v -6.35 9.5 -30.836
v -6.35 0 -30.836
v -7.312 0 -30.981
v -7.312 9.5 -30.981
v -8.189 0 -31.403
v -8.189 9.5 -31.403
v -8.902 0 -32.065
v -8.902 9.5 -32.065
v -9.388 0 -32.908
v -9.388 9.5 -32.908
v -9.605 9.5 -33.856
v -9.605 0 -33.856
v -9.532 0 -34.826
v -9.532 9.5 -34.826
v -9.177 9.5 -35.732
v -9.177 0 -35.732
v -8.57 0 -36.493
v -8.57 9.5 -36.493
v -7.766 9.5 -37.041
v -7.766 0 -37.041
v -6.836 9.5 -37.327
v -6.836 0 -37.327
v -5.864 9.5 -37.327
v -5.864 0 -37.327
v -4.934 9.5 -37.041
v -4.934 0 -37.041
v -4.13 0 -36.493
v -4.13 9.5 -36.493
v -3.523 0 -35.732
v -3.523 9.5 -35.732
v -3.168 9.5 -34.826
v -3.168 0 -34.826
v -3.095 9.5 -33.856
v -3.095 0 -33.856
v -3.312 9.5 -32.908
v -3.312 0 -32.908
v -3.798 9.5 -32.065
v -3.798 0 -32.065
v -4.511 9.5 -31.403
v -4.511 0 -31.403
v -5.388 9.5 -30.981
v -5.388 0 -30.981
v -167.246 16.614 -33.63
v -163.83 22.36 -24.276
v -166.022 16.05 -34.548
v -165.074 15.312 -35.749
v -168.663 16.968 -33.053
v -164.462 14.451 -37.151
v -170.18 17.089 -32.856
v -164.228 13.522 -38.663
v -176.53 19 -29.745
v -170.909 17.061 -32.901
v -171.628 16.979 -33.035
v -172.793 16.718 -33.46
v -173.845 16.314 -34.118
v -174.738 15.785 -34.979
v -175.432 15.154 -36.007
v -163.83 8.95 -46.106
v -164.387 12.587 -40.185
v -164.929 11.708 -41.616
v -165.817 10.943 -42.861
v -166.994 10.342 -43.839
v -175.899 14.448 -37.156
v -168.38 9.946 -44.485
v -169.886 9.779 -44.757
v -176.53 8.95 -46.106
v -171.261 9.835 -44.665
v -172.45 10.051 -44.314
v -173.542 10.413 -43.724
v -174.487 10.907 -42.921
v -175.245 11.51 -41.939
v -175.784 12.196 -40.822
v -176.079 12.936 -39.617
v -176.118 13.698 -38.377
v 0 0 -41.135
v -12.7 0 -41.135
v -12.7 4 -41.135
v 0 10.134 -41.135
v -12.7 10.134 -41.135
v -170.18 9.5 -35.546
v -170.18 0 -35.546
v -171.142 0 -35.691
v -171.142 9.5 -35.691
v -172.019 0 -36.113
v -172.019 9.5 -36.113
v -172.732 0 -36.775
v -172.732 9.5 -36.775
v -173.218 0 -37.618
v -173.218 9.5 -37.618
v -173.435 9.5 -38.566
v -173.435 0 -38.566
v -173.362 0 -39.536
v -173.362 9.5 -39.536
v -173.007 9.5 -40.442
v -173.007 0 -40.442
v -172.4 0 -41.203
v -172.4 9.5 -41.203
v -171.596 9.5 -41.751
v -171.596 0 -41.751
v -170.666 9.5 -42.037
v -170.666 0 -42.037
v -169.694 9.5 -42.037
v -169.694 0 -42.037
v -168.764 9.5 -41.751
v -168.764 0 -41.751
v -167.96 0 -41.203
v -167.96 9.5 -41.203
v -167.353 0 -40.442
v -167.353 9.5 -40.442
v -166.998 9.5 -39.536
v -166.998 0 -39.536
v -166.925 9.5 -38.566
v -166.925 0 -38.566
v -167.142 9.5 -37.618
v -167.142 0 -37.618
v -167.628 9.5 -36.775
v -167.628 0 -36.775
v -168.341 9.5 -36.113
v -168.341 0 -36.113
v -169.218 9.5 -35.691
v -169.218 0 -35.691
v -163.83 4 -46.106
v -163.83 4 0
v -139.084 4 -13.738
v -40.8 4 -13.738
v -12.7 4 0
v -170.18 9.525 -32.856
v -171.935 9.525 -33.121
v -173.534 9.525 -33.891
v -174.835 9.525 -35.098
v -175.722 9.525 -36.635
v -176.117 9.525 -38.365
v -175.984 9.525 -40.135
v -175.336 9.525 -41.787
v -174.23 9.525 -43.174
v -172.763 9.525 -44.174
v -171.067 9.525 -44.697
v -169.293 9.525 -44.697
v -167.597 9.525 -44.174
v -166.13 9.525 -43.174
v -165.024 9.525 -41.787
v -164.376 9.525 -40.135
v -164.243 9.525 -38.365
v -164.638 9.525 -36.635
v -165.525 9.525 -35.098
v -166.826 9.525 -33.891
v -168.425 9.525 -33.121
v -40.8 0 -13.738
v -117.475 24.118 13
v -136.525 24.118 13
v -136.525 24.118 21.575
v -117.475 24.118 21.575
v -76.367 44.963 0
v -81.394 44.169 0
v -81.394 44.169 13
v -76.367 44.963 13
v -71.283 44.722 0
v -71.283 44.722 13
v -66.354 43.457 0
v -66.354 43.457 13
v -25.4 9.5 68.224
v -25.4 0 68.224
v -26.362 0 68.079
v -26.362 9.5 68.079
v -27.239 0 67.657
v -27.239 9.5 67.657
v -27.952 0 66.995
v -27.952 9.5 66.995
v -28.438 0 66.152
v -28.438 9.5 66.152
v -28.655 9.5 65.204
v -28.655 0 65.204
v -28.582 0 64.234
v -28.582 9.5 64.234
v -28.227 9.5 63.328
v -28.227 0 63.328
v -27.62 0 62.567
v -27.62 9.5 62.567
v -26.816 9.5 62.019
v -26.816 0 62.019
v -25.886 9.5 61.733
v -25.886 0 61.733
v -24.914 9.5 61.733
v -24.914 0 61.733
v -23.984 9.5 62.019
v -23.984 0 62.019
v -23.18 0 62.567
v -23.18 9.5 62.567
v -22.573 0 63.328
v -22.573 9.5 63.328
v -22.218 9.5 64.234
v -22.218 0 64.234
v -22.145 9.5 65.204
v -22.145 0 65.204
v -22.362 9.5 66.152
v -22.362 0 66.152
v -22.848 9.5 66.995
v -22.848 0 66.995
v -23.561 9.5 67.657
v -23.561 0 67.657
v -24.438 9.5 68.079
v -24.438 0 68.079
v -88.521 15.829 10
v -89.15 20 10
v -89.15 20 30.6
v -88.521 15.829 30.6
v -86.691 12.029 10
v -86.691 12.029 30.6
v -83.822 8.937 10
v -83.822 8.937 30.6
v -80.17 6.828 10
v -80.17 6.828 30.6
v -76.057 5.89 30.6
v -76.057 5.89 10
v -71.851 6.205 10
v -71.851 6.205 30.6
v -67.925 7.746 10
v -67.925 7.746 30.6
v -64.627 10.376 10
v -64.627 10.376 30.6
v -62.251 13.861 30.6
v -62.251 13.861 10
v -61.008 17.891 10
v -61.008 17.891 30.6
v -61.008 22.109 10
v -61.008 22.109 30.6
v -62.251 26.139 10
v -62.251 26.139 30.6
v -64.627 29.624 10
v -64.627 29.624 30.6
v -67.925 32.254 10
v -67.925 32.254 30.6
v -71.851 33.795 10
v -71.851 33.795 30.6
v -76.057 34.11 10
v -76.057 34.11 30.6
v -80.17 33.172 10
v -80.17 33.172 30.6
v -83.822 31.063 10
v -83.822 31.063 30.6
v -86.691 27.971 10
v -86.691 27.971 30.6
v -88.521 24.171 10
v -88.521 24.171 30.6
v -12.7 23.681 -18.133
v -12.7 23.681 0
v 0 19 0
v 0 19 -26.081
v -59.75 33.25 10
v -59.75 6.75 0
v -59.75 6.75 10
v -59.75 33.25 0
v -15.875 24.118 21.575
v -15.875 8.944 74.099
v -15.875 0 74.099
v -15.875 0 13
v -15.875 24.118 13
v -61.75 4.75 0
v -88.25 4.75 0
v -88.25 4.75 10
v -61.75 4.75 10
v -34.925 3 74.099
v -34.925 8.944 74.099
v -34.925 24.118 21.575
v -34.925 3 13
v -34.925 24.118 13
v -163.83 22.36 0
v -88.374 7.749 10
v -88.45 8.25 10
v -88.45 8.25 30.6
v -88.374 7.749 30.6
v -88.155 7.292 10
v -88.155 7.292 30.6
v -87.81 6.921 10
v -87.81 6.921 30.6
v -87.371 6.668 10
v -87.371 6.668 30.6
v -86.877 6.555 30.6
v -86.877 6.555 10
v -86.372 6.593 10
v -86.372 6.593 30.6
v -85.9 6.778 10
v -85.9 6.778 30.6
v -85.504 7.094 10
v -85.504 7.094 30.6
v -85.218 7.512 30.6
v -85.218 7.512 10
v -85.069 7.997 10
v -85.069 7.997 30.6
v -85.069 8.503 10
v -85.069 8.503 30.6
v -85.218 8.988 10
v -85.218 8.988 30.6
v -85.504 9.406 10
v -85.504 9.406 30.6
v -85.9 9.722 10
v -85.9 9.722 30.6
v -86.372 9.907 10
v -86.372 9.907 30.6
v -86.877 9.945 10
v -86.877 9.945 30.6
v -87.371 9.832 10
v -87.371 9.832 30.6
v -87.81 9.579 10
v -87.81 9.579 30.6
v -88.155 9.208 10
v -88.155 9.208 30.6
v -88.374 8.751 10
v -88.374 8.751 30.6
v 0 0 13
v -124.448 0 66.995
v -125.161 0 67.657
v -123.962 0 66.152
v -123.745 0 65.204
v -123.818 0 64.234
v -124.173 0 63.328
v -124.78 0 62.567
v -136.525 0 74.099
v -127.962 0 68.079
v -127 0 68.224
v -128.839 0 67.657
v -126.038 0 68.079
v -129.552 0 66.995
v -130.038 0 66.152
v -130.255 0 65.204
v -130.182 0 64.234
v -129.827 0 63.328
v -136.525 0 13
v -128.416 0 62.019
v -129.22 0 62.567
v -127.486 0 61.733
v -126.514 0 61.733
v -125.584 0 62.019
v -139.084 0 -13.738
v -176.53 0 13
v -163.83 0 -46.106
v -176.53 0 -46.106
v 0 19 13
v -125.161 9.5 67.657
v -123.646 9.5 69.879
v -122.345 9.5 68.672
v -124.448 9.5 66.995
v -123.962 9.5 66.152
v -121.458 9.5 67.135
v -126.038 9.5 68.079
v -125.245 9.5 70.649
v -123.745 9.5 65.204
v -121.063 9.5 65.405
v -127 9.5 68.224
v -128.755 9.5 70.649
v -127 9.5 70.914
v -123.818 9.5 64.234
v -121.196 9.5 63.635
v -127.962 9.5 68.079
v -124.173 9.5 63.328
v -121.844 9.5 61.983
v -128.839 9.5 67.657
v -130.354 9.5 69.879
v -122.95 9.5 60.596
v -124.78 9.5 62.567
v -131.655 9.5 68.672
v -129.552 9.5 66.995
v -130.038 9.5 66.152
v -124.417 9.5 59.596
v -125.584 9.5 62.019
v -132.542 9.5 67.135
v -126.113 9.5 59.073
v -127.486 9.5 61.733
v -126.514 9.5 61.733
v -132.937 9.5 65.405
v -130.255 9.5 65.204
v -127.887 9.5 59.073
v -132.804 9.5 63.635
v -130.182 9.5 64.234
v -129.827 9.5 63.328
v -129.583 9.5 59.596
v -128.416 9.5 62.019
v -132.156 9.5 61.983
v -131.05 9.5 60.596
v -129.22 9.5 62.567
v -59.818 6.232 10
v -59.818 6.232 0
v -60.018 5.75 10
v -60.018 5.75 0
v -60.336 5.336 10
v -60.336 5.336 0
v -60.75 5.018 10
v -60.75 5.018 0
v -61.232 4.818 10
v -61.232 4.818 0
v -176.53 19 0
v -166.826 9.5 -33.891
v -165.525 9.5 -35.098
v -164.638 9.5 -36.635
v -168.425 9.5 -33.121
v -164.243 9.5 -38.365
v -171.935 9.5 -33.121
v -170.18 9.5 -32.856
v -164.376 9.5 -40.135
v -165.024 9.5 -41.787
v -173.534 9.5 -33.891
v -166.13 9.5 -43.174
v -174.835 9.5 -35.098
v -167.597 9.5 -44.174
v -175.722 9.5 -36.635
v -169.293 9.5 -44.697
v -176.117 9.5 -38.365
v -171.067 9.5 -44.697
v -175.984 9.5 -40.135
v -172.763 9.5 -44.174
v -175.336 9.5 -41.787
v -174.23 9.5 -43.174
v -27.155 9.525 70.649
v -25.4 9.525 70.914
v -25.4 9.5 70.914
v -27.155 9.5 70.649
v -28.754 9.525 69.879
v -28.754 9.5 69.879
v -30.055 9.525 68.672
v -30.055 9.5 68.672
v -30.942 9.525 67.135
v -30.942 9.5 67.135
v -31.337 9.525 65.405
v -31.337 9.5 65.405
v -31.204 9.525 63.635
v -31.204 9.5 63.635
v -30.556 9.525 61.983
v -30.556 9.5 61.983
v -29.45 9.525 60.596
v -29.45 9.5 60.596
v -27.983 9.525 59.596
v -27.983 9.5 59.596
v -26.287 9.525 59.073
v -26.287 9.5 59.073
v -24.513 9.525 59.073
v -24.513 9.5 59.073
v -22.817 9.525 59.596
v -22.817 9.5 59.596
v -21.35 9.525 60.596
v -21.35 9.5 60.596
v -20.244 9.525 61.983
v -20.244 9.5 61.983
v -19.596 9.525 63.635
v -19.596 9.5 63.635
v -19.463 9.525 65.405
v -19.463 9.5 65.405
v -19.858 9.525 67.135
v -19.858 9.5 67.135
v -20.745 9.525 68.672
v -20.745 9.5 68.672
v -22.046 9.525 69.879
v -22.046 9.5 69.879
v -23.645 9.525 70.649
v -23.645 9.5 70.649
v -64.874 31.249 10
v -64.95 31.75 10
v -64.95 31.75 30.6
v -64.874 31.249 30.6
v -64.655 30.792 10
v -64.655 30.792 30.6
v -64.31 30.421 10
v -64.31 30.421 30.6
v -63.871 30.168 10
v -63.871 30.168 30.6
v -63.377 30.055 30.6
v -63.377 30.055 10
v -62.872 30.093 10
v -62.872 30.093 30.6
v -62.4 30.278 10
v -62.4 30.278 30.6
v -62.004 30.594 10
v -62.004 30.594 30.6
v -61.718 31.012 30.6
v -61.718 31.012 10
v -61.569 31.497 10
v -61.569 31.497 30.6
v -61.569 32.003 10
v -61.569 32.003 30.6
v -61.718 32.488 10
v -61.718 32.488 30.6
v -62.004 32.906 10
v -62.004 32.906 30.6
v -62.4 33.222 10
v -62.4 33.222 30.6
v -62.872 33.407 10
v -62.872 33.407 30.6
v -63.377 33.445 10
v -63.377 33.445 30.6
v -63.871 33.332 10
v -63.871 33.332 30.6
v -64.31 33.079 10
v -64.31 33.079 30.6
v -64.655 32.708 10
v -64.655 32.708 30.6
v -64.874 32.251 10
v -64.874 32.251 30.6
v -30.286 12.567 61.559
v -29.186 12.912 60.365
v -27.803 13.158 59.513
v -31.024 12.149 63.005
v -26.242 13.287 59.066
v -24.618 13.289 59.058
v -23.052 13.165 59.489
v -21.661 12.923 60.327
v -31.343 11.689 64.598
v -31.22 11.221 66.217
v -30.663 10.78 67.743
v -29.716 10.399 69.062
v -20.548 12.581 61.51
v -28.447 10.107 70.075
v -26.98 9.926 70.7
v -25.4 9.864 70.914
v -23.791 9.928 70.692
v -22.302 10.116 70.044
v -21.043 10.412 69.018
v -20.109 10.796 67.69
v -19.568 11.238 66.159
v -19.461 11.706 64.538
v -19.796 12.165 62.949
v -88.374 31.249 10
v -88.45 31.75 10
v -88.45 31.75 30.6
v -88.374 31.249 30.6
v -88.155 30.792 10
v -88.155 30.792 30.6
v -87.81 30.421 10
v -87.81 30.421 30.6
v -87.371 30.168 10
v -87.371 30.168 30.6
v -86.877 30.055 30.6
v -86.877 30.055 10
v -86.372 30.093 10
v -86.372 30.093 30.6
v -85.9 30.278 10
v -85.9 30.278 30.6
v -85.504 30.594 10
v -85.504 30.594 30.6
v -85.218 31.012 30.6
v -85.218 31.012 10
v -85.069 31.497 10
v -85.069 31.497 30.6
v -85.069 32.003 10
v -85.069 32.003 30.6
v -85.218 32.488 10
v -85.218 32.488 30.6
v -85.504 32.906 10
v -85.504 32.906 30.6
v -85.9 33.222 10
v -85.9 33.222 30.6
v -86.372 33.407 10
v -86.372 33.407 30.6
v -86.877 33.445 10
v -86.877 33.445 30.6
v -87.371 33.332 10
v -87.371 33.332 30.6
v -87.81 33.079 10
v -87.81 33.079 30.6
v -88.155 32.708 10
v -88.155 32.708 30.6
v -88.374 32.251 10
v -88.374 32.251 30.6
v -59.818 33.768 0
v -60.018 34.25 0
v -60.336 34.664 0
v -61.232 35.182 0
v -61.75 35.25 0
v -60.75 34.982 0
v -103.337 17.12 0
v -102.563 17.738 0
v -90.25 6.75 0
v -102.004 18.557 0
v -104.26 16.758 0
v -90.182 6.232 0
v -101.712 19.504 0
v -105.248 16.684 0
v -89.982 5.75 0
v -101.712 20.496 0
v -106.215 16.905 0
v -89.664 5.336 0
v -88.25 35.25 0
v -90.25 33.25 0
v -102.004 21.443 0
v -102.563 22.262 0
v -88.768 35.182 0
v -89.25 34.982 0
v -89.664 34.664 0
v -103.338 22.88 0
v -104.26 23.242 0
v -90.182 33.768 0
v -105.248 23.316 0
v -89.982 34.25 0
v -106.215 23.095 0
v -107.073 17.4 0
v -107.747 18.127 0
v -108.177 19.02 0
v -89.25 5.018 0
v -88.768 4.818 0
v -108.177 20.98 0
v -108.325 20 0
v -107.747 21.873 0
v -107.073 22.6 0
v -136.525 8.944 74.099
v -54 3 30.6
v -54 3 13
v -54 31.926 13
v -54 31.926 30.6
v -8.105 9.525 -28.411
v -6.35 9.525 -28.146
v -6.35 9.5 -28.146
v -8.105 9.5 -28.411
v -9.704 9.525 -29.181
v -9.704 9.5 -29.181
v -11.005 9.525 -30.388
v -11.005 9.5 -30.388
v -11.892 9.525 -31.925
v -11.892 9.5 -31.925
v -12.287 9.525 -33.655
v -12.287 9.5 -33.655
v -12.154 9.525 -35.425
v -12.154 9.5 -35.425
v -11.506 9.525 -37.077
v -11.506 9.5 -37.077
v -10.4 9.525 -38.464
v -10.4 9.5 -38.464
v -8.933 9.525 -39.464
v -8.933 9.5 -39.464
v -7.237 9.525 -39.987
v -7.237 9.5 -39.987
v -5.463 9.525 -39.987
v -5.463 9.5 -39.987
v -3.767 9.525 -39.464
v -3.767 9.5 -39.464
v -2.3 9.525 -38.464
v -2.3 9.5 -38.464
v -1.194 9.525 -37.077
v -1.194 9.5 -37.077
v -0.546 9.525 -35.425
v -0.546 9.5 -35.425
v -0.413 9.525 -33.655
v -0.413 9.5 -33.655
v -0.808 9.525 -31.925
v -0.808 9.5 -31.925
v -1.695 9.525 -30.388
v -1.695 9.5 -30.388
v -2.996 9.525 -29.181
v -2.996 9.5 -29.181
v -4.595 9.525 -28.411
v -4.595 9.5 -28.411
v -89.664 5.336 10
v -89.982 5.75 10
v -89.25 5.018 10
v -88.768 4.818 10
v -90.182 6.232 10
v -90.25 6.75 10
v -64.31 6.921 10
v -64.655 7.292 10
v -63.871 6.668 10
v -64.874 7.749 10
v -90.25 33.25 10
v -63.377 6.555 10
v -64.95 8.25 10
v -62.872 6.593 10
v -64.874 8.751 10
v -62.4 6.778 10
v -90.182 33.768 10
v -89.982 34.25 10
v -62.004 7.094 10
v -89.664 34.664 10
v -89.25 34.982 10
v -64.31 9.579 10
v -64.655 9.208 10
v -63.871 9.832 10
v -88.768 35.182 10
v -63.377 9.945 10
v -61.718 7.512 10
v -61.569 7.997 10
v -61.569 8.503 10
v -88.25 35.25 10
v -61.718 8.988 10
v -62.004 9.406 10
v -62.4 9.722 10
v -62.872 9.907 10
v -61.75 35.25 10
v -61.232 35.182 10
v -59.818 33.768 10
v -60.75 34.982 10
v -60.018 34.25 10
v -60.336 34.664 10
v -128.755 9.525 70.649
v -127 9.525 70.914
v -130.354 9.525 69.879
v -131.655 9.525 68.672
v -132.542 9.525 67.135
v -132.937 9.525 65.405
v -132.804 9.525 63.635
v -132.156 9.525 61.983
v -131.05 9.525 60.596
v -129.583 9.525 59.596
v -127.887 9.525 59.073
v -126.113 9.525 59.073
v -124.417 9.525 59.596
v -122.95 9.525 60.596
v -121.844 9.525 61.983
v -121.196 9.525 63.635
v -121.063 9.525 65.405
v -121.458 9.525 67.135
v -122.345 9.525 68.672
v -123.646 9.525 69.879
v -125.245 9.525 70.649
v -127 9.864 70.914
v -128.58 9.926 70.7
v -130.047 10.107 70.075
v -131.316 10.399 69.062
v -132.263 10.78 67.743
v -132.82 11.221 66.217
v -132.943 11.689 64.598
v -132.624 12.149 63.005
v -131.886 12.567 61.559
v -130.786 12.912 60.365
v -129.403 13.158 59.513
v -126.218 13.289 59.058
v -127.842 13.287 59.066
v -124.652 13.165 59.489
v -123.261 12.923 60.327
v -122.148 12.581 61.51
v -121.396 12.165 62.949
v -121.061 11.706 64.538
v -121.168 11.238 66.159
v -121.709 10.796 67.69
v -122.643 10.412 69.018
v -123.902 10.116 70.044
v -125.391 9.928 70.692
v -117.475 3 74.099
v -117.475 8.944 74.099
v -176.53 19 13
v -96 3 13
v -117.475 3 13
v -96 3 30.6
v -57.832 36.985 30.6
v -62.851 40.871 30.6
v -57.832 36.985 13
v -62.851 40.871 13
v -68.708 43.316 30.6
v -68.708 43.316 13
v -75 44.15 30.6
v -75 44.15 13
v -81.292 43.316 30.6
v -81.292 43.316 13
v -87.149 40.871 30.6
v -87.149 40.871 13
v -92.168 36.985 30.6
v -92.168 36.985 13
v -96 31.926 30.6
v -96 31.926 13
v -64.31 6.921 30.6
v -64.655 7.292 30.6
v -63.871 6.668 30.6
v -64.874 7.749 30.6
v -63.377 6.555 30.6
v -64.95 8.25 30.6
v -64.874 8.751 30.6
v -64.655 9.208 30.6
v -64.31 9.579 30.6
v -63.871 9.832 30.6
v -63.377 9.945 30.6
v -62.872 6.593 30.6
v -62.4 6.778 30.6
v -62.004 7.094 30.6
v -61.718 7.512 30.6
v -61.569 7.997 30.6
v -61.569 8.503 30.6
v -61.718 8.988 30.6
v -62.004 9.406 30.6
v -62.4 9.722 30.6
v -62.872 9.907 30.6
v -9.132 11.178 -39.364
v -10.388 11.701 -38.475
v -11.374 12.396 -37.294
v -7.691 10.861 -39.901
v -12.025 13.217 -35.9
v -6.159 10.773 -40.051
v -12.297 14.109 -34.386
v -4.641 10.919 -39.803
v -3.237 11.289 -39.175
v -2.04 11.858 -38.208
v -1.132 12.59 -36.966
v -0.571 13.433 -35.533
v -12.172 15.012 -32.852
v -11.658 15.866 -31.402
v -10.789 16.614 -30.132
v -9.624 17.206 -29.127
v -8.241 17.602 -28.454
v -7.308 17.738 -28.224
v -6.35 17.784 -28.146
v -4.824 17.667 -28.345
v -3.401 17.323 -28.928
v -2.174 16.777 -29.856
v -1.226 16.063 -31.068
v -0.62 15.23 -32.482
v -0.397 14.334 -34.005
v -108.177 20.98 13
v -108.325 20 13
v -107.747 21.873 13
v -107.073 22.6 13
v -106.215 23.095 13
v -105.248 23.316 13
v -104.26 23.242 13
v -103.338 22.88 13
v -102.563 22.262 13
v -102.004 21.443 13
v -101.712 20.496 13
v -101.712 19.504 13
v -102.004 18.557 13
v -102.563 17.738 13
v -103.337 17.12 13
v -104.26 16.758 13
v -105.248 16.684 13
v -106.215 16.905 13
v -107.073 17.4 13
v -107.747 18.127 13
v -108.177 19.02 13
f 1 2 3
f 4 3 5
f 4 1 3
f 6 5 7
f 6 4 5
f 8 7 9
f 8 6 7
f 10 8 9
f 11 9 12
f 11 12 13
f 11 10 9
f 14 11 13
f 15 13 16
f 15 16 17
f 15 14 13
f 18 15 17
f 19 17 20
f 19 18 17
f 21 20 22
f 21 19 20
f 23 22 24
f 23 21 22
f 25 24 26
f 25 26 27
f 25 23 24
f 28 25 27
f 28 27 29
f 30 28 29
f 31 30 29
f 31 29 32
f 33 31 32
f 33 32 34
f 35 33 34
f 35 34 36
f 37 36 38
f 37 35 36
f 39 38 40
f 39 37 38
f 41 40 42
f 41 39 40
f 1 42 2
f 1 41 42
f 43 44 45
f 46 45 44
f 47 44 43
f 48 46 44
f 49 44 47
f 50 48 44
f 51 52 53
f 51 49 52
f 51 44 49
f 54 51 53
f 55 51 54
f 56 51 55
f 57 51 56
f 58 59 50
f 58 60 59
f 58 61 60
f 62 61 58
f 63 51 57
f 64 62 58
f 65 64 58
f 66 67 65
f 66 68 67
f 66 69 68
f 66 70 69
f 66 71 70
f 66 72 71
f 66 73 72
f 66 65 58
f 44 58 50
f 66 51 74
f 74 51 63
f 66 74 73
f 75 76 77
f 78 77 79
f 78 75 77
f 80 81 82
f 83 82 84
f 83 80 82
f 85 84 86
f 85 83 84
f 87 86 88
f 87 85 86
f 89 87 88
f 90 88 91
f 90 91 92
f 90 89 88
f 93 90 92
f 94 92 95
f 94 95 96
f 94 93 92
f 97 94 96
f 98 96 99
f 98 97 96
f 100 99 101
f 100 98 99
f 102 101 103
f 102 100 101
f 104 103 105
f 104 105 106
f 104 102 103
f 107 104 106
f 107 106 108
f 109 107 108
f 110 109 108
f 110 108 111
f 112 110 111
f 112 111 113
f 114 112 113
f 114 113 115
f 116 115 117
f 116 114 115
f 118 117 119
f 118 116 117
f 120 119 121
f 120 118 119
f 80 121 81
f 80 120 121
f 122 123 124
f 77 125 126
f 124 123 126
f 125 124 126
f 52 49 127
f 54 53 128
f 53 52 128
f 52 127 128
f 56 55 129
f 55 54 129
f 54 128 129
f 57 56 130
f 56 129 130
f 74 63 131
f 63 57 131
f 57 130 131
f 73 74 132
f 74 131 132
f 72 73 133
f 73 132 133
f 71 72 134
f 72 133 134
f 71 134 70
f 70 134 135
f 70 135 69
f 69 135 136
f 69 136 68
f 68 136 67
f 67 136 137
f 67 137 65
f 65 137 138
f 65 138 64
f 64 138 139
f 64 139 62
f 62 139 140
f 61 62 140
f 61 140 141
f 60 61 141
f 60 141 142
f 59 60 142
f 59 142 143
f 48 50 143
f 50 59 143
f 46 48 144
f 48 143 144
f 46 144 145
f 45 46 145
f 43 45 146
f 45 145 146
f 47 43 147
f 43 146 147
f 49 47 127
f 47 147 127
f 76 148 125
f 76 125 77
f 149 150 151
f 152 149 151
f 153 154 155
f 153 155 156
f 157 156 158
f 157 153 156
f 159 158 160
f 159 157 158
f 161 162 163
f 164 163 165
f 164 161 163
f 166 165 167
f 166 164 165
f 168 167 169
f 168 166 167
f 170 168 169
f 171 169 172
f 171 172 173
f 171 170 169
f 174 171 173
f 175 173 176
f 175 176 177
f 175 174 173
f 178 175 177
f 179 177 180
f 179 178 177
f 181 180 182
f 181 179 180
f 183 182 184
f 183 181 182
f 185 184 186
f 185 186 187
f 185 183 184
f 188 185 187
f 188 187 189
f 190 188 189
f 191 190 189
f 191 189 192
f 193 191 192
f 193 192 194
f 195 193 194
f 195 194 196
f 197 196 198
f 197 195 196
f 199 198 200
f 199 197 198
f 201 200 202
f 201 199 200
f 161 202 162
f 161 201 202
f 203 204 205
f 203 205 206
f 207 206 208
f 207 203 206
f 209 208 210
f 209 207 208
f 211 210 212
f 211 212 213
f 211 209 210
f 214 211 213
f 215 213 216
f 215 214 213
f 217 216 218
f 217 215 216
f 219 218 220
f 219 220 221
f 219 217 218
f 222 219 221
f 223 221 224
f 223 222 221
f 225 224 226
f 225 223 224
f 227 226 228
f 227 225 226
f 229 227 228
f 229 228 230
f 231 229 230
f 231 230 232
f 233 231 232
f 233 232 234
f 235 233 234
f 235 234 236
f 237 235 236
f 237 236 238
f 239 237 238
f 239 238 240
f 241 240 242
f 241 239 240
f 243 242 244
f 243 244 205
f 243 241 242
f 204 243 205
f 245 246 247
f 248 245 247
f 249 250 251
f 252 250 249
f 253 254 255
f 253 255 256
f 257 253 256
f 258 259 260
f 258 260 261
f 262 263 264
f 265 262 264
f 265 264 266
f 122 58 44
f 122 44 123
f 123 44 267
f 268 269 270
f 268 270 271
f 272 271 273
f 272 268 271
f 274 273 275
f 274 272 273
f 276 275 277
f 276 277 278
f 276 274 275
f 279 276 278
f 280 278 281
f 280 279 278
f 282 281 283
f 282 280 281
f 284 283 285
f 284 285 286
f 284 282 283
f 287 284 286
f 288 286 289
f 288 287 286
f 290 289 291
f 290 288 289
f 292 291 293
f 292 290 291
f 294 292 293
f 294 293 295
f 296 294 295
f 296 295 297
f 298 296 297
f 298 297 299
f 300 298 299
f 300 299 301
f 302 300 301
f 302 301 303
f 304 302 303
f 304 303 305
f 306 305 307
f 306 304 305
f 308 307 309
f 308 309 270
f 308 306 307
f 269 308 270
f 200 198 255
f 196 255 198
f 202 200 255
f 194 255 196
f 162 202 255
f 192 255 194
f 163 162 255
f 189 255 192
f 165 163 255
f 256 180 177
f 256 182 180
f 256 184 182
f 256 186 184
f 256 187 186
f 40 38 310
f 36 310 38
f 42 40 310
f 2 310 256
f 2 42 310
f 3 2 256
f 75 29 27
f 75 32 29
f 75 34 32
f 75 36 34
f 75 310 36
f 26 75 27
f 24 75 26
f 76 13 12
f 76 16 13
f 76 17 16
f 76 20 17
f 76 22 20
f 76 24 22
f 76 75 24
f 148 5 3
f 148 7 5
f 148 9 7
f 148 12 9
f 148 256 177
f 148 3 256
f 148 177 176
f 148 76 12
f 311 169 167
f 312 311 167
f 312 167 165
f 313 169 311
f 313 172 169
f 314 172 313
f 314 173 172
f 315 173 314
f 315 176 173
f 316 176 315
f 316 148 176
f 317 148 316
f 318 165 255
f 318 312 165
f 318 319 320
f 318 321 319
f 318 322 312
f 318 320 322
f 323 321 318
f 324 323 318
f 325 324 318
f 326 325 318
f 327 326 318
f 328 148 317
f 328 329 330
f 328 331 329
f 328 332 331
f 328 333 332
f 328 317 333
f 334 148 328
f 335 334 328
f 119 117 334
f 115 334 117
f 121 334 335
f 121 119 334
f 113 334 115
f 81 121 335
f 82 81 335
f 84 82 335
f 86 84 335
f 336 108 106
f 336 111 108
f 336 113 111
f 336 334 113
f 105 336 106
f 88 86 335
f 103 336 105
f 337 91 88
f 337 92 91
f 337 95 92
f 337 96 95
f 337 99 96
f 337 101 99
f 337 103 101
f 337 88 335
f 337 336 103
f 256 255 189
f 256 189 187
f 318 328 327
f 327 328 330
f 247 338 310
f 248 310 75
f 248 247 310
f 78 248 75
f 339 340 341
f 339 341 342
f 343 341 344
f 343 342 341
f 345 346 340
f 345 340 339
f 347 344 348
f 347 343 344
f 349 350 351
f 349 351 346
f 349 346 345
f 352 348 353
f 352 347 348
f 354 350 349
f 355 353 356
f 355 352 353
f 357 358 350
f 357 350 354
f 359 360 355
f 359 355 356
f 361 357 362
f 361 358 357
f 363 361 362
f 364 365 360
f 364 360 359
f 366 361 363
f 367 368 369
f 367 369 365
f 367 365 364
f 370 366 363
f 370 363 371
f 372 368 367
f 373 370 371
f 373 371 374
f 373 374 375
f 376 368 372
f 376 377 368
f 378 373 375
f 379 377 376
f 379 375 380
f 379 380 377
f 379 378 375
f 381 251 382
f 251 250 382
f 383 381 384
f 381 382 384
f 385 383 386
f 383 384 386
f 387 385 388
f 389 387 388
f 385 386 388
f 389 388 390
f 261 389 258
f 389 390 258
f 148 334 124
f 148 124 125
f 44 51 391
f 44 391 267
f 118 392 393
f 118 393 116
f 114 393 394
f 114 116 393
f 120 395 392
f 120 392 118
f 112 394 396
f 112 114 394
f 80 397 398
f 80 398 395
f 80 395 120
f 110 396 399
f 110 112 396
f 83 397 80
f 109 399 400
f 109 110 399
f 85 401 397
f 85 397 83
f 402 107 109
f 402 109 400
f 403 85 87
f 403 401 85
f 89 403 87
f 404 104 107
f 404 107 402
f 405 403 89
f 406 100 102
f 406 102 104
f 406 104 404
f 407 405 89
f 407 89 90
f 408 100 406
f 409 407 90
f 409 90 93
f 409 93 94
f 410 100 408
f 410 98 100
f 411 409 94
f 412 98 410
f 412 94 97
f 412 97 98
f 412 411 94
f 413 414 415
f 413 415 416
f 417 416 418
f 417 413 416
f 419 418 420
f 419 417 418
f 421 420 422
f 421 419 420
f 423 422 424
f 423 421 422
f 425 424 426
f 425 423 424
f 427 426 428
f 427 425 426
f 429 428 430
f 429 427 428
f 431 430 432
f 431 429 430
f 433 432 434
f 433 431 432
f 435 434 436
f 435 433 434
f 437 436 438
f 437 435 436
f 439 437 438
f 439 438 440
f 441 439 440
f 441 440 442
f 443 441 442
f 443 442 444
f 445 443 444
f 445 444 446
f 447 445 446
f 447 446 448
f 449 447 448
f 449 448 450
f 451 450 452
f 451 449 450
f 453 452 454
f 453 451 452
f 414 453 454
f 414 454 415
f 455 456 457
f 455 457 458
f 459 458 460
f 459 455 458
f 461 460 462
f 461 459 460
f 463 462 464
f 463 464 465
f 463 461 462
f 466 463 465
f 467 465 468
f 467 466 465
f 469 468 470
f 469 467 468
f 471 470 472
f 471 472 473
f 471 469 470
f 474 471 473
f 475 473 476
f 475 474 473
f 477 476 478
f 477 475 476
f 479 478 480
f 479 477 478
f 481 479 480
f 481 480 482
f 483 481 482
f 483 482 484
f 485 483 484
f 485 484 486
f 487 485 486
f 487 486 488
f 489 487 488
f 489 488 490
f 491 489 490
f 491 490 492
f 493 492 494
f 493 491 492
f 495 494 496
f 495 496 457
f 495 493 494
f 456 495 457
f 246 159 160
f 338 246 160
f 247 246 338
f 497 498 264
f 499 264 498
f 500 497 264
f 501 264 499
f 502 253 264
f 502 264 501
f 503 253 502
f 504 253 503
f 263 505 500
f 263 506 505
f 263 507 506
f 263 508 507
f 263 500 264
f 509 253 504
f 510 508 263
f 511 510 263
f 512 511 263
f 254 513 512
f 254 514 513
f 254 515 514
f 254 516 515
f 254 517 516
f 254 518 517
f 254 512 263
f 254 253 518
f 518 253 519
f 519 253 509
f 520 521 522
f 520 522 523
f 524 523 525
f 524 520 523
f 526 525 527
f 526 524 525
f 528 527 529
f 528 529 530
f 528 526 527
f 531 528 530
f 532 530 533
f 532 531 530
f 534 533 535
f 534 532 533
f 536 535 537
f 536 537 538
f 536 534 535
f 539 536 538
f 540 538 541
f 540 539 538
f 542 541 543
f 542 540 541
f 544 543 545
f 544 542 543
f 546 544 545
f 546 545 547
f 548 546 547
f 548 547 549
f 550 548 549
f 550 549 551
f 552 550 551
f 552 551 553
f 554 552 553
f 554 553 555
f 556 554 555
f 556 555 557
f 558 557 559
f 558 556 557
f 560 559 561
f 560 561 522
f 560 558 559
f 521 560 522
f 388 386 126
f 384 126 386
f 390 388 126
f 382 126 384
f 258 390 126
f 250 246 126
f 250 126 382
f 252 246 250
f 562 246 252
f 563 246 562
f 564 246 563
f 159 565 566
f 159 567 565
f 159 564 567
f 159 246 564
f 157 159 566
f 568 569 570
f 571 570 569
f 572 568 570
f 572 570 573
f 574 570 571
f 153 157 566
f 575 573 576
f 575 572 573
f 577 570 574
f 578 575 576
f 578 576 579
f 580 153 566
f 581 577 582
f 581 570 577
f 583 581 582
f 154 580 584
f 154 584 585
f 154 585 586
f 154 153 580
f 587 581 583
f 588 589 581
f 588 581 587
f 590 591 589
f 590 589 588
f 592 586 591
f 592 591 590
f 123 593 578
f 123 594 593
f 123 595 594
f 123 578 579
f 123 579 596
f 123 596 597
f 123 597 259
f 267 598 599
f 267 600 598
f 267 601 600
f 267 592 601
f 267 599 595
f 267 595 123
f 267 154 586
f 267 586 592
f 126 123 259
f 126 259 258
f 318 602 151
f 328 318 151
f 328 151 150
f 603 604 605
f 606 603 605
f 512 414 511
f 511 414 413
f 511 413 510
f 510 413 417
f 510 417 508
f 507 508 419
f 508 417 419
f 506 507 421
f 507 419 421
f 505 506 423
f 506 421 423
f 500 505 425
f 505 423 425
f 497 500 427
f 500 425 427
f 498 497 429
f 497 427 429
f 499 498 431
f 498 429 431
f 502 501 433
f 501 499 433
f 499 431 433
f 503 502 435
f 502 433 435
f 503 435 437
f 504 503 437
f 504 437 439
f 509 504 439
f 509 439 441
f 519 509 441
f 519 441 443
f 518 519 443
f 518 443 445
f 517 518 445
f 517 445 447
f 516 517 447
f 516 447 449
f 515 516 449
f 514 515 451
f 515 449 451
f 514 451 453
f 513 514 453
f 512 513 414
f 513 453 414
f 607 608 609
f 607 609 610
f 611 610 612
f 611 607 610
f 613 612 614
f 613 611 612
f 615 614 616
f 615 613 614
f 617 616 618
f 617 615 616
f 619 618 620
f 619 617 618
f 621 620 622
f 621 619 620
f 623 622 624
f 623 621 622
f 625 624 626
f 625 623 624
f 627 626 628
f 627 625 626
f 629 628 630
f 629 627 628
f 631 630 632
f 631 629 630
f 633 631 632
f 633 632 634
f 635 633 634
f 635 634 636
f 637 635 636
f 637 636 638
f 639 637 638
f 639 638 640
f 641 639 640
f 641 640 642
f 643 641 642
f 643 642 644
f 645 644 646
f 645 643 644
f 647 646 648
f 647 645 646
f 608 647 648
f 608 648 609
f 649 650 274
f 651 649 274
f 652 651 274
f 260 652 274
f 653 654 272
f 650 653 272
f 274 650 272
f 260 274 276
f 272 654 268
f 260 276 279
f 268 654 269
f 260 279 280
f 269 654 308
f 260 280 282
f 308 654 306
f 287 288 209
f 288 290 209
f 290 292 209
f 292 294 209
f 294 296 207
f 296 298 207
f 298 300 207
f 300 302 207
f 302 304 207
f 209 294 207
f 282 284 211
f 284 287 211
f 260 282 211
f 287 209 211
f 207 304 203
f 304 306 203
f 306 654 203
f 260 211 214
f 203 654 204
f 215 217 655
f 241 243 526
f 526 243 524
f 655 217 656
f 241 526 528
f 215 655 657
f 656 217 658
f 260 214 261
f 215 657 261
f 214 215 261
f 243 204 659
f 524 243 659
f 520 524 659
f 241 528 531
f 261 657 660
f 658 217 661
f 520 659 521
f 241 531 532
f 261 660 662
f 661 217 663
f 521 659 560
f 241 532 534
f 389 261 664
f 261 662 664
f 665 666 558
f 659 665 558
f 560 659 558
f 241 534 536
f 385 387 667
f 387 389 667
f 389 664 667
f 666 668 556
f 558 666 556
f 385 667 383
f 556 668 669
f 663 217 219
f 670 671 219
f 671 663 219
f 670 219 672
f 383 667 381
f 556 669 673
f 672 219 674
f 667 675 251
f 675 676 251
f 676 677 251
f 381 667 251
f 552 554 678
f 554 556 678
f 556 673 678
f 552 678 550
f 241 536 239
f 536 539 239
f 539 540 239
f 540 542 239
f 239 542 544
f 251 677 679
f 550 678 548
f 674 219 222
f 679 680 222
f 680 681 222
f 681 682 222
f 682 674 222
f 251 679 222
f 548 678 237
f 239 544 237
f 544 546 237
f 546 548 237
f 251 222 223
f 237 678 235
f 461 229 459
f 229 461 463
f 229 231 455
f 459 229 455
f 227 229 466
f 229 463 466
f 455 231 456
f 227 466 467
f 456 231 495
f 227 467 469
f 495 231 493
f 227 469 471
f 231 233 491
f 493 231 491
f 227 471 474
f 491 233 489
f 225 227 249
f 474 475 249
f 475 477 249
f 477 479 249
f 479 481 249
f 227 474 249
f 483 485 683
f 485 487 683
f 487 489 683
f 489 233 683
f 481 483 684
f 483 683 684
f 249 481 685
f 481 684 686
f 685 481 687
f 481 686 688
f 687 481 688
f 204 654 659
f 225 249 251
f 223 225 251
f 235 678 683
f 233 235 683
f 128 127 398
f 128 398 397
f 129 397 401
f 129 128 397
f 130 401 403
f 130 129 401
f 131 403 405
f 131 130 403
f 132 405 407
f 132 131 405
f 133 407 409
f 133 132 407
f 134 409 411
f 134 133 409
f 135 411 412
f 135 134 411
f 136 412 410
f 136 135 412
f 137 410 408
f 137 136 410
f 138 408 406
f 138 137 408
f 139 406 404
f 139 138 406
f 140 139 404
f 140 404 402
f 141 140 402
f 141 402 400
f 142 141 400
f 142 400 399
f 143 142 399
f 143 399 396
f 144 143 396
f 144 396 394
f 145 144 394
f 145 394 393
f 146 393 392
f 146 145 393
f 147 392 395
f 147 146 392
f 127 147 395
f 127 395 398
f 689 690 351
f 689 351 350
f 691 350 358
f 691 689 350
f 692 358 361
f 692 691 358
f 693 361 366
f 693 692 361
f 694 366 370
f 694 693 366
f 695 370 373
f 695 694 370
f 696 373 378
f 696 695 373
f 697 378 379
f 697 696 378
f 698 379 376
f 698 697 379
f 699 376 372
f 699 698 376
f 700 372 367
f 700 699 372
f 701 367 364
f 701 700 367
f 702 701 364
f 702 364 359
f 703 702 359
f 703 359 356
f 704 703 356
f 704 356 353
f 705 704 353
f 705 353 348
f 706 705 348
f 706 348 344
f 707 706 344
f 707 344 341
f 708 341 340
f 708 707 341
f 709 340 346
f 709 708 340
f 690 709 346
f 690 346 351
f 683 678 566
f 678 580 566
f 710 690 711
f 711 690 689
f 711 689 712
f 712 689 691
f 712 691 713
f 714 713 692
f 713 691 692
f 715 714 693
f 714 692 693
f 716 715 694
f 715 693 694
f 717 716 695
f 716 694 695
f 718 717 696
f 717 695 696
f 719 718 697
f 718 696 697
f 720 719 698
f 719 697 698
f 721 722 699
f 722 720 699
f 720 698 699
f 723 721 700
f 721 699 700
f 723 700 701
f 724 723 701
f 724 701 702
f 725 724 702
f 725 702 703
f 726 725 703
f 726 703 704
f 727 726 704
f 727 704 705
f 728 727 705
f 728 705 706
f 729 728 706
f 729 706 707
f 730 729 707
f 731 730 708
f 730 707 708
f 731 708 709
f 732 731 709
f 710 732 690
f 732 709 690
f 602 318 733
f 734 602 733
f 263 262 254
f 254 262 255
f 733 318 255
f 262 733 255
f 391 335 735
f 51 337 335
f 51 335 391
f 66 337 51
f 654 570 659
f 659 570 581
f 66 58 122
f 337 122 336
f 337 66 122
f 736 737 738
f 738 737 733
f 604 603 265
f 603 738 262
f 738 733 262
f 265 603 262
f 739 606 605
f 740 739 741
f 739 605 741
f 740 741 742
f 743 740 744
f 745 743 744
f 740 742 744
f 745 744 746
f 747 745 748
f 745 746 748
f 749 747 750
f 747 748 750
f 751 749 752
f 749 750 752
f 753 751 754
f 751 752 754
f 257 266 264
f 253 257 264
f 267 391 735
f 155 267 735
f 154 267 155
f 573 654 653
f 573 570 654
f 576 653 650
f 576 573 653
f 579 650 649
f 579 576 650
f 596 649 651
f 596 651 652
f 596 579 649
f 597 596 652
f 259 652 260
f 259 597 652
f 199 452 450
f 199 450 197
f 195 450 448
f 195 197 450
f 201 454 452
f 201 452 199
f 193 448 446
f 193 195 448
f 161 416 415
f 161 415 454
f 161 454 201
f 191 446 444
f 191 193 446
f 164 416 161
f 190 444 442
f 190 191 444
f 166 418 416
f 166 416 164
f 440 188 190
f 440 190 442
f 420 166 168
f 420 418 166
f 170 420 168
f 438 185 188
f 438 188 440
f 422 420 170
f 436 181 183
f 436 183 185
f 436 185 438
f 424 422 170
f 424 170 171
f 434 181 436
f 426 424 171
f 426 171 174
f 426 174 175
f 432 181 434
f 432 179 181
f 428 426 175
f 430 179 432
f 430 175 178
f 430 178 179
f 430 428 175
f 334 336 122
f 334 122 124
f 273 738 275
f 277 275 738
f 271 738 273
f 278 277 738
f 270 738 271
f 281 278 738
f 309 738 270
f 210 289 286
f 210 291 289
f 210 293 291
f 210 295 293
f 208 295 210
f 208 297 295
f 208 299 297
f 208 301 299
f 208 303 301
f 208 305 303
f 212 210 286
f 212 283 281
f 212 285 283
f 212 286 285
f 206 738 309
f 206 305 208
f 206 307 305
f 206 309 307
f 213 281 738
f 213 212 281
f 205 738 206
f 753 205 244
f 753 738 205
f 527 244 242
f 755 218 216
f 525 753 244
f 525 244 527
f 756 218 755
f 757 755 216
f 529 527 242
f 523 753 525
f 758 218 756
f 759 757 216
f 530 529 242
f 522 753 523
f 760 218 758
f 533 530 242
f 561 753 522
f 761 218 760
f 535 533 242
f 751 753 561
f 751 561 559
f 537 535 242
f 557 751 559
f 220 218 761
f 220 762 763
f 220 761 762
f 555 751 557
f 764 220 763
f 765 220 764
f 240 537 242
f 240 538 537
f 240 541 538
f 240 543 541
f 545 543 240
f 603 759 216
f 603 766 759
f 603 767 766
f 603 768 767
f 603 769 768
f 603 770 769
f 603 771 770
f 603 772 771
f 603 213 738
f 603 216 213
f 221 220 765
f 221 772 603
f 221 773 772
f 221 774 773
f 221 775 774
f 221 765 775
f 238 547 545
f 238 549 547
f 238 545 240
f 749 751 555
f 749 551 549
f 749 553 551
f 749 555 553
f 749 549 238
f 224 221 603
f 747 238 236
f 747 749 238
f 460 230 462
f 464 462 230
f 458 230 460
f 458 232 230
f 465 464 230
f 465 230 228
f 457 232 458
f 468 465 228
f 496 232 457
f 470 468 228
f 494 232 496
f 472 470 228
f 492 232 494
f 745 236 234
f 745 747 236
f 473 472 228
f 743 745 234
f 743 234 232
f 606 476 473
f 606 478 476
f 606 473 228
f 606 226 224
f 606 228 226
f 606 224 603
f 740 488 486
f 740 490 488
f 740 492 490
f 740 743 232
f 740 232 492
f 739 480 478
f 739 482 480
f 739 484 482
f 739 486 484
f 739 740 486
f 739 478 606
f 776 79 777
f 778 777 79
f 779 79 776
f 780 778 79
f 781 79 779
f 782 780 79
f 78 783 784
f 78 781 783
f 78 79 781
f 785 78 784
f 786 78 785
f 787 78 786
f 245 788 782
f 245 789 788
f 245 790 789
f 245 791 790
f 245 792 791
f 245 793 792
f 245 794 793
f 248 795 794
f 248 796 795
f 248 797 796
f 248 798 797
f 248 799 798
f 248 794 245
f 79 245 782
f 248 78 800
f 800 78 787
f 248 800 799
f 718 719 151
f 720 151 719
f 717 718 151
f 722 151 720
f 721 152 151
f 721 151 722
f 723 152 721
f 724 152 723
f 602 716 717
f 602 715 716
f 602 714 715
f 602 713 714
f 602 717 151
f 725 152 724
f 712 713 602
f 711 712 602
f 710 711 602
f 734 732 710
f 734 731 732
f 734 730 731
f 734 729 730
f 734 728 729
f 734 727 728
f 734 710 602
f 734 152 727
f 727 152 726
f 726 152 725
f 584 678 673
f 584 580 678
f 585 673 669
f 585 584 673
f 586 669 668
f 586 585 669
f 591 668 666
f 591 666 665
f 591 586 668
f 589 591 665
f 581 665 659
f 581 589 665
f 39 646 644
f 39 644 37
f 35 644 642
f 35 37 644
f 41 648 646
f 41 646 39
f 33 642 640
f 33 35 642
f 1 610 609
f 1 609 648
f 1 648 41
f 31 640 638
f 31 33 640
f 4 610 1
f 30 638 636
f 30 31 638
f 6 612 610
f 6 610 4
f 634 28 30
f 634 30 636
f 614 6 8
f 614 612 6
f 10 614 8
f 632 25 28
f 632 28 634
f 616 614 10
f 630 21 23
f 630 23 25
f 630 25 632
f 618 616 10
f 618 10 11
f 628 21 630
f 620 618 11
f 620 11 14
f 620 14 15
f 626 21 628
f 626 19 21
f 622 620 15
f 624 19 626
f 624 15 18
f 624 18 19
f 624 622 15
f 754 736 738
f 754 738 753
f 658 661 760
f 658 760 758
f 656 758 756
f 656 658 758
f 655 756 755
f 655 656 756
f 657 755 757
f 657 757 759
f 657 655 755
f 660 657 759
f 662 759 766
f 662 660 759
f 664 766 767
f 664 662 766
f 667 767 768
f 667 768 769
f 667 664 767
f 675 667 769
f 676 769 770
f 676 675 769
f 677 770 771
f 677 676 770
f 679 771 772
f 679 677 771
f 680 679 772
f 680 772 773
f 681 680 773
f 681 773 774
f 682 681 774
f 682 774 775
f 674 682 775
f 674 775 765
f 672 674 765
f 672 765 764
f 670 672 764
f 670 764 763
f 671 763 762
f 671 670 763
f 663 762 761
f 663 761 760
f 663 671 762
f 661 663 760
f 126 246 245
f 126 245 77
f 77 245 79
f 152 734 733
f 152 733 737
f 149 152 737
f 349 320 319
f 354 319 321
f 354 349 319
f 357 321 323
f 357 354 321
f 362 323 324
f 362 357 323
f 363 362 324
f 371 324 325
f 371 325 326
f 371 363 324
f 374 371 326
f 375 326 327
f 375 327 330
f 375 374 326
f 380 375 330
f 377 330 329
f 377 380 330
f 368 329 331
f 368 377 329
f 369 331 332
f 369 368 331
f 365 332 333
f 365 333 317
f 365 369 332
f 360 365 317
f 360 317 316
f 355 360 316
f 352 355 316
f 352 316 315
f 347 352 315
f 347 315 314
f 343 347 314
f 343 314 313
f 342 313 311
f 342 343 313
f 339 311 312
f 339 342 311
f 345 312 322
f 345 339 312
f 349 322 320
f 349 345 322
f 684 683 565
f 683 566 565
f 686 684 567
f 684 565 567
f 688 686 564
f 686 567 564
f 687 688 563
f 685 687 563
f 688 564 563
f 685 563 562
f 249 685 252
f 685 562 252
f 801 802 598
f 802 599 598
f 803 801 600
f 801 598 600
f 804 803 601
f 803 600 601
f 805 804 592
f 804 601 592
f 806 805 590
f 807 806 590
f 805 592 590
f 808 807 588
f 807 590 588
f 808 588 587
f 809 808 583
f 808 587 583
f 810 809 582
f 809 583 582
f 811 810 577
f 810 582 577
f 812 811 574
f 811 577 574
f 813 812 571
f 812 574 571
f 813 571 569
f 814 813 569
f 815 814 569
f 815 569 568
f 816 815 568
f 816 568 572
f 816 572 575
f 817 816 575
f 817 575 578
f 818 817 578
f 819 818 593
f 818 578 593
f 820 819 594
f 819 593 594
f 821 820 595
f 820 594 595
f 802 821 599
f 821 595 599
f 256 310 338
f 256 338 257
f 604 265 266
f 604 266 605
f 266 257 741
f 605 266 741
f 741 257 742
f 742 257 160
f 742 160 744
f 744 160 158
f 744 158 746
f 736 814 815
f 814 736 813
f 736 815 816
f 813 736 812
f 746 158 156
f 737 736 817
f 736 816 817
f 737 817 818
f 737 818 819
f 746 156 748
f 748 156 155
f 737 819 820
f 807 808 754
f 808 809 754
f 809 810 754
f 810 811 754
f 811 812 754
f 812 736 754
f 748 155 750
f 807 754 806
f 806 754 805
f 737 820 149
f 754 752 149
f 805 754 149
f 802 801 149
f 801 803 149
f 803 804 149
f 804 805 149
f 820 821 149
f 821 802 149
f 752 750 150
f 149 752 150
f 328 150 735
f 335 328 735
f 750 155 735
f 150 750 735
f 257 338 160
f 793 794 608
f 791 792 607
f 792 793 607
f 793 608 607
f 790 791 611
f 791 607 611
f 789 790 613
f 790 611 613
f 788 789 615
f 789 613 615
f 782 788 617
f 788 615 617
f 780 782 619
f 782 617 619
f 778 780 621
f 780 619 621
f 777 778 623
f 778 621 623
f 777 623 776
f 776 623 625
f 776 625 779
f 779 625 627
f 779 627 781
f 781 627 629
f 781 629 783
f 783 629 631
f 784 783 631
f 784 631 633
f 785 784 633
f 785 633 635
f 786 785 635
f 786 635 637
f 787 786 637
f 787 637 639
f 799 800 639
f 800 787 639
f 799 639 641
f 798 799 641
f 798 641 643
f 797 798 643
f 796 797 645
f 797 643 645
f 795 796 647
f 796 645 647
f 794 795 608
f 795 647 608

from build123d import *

# Parameters (mm, degrees)
SKETCH2_W                                     = 176.53
SKETCH2_H                                     = 28.1
BOSS_EXTRUDE1_DEPTH                           = 5
SKETCH3_R                                     = 6.635934172
SKETCH3_R_2                                   = 3.325
BOSS_EXTRUDE2_DEPTH                           = 5
SKETCH4_R                                     = 6.635934172
SKETCH4_R_2                                   = 3.325
BOSS_EXTRUDE3_DEPTH                           = 5
SKETCH5_R                                     = 3.175
SKETCH5_R_2                                   = 3.890528803
BOSS_EXTRUDE4_DEPTH                           = 5
SKETCH9_R                                     = 24.15
SKETCH9_R_2                                   = 14.15
SKETCH9_R_3                                   = 1.7
BOSS_EXTRUDE5_DEPTH                           = 20.6
SKETCH7_W                                     = 30.5
SKETCH7_H                                     = 30.5
CUT_EXTRUDE2_DEPTH                            = 26.6
BOSS_EXTRUDE6_DEPTH                           = 12.7
BOSS_EXTRUDE7_DEPTH                           = 9.525
BOSS_EXTRUDE8_DEPTH                           = 9.525
SKETCH16_W                                    = 82.55
SKETCH16_H                                    = 69.099082758
BOSS_EXTRUDE9_DEPTH                           = 3
DELETEFACE1_START                             = 5
DELETEFACE1_DEPTH                             = 20.6
BOSS_EXTRUDE10_DEPTH                          = 6.35
BOSS_EXTRUDE11_DEPTH                          = 6.35
CBORE_FOR_1_4_BUTTON_HEAD_CAP_SCREW1_AT_COUNT = 2
CBORE_FOR_1_4_BUTTON_HEAD_CAP_SCREW1_AT_PITCH = 100.875101487
CBORE_FOR_1_4_BUTTON_HEAD_CAP_SCREW1_2_COUNT  = 2
CBORE_FOR_1_4_BUTTON_HEAD_CAP_SCREW1_2_PITCH  = 156.106713821
CBORE_FOR_1_4_BUTTON_HEAD_CAP_SCREW1_3_COUNT  = 2
CBORE_FOR_1_4_BUTTON_HEAD_CAP_SCREW1_3_PITCH  = 163.897690649
SKETCH21_R                                    = 5.95376
CUT_EXTRUDE3_DEPTH                            = 195.710016667
SKETCH23_W                                    = 8
SKETCH23_H                                    = 28.925707526
CUT_EXTRUDE4_DEPTH                            = 20.6
DELETEFACE5_START                             = 5
DELETEFACE5_DEPTH                             = 20.6
BOSS_EXTRUDE12_DEPTH                          = 4
MOVE_FACE3_BY                                 = 5
MOVE_FACE4_BY                                 = 5
FILLET1_R                                     = 2
MOVE_FACE5_BY                                 = 8


# Read off the part's stored shape, not the designer's step: DeleteFace1, DeleteFace5, Split1, Split2
with BuildPart() as part:
    # Sketch2 → Boss-Extrude1 (new body)
    with BuildSketch(Plane(origin=(0, 0, 0), x_dir=(1, 0, 0), z_dir=(0, 1, 0))):
        with Locations((-88.265, 14.05)):
            Rectangle(SKETCH2_W, SKETCH2_H)
    extrude(amount=BOSS_EXTRUDE1_DEPTH)

    # Sketch5 → Boss-Extrude4 (add)
    # profile 1 of 2: a face of its own
    with BuildSketch(Plane(origin=(0, 5, 0), x_dir=(1, 0, 0), z_dir=(0, 1, 0))):
        with BuildLine():
            Line((0, 28.1), (0, 34.1))
            ThreePointArc((0, 34.1), (-2.58351874, 39.212349648), (-8.231848479, 40.164746186))
            Line((-8.231848479, 40.164746186), (-47.113631063, 28.1))
            Line((-47.113631063, 28.1), (0, 28.1))
        make_face()
        with Locations(Location((-6.35, 34.1, 0), (0, 0, 270))):
            Circle(SKETCH5_R, mode=Mode.SUBTRACT)
    # profile 2 of 2: a face of its own
    with BuildSketch(Plane(origin=(0, 5, 0), x_dir=(1, 0, 0), z_dir=(0, 1, 0))):
        with BuildLine():
            Line((0, 0), (0, -42.25))
            ThreePointArc((0, -42.25), (-4.382179377, -48.287398612), (-11.480372282, -45.991895275))
            Line((-11.480372282, -45.991895275), (-45.025083296, 0))
            Line((-45.025083296, 0), (0, 0))
        make_face()
        with Locations(Location((-6.35, -42.25, 0), (0, 0, 270))):
            Circle(SKETCH5_R_2, mode=Mode.SUBTRACT)
    extrude(amount=-BOSS_EXTRUDE4_DEPTH)


with BuildPart() as body_2:
    # Sketch3 → Boss-Extrude2 (new body)
    with BuildSketch(Plane(origin=(0, 0, 0), x_dir=(-1, 0, 0), z_dir=(0, 0, -1))):
        with BuildLine():
            Line((0, 0), (176.53, 0))
            Line((176.53, 0), (176.53, 19))
            Line((176.53, 19), (81.3938594, 44.168544887))
            ThreePointArc((81.3938594, 44.168544887), (73.819063639, 44.972092209), (66.353902645, 43.457301646))
            Line((66.353902645, 43.457301646), (0, 19))
            Line((0, 19), (0, 0))
        make_face()
        with Locations((75, 20)):
            Circle(SKETCH3_R, mode=Mode.SUBTRACT)
        with Locations((105, 20)):
            Circle(SKETCH3_R_2, mode=Mode.SUBTRACT)
    extrude(amount=-BOSS_EXTRUDE2_DEPTH)

    # Sketch9 → Boss-Extrude5 (add)
    with BuildSketch(Plane.XY.offset(5)):
        with Locations(Location((-75, 20, 0), (0, 0, 235.909915964))):
            Circle(SKETCH9_R)
        with Locations(Location((-75, 20, 0), (0, 0, 180))):
            Circle(SKETCH9_R_2, mode=Mode.SUBTRACT)
        with Locations(Location((-86.75, 31.75, 0), (0, 0, 180))):
            Circle(SKETCH9_R_3, mode=Mode.SUBTRACT)
        with Locations(Location((-63.25, 31.75, 0), (0, 0, 180))):
            Circle(SKETCH9_R_3, mode=Mode.SUBTRACT)
        with Locations(Location((-63.25, 8.25, 0), (0, 0, 180))):
            Circle(SKETCH9_R_3, mode=Mode.SUBTRACT)
        with Locations(Location((-86.75, 8.25, 0), (0, 0, 180))):
            Circle(SKETCH9_R_3, mode=Mode.SUBTRACT)
    extrude(amount=BOSS_EXTRUDE5_DEPTH)

    # Sketch7 → Cut-Extrude2 (cut)
    with BuildSketch(Plane.XY.offset(5)):
        with Locations((-75, 20)):
            Rectangle(SKETCH7_W, SKETCH7_H)
    extrude(amount=-CUT_EXTRUDE2_DEPTH, mode=Mode.SUBTRACT)

    # Sketch14 → Boss-Extrude7 (add, symmetric)
    with BuildSketch(Plane(origin=(-25.4, 0, 0), x_dir=(0, 0, -1), z_dir=(1, 0, 0))):
        Polygon((-74.099082758, 0), (-5, 0), (-5, 24.117845296), (-21.574974436, 24.117845296), (-74.099082758, 8.944214003), align=None)
    extrude(amount=BOSS_EXTRUDE7_DEPTH, both=True)

    # Sketch15 → Boss-Extrude8 (add, symmetric)
    with BuildSketch(Plane(origin=(-127, 0, 0), x_dir=(0, 0, -1), z_dir=(1, 0, 0))):
        Polygon((-74.099082758, 8.944214003), (-74.099082758, 0), (-5, 0), (-5, 24.117845296), (-21.574974436, 24.117845296), align=None)
    extrude(amount=BOSS_EXTRUDE8_DEPTH, both=True)

    # Sketch16 → Boss-Extrude9 (add)
    with BuildSketch(Plane.XZ):
        with Locations((-76.2, 39.549541379)):
            Rectangle(SKETCH16_W, SKETCH16_H)
    extrude(amount=-BOSS_EXTRUDE9_DEPTH)

    # DeleteFace1 outline → DeleteFace1 (cut)
    with BuildSketch(Plane.XY.offset(DELETEFACE1_START)):
        with BuildLine():
            ThreePointArc((-88.535970597, 0), (-75, -4.15), (-61.464029403, 0))
            Line((-61.464029403, 0), (-88.535970597, 0))
        make_face()
    extrude(amount=DELETEFACE1_DEPTH, mode=Mode.SUBTRACT)


with BuildPart() as body_3:
    # Sketch4 → Boss-Extrude3 (new body)
    with BuildSketch(Plane.XY.offset(-33.1)):
        with BuildLine():
            Line((-176.53, 19), (-176.53, 0))
            Line((-176.53, 0), (0, 0))
            Line((0, 0), (0, 19))
            Line((0, 19), (-66.353902645, 43.457301646))
            ThreePointArc((-66.353902645, 43.457301646), (-73.819063639, 44.972092209), (-81.3938594, 44.168544887))
            Line((-81.3938594, 44.168544887), (-176.53, 19))
        make_face()
        with Locations(Location((-75, 20, 0), (0, 0, 180))):
            Circle(SKETCH4_R, mode=Mode.SUBTRACT)
        with Locations(Location((-105, 20, 0), (0, 0, 180))):
            Circle(SKETCH4_R_2, mode=Mode.SUBTRACT)
    extrude(amount=BOSS_EXTRUDE3_DEPTH)


with BuildPart() as body_4:
    # Sketch11 → Boss-Extrude6 (new body)
    with BuildSketch(Plane(origin=(0, 0, 0), x_dir=(0, 0, -1), z_dir=(1, 0, 0))):
        Polygon((28.1, 0), (42.275, 0), (42.275, 8), (37.1, 18), (28.1, 18), align=None)
    extrude(amount=-BOSS_EXTRUDE6_DEPTH)


with BuildPart() as body_2_2:
    # Sketch17 → Boss-Extrude10 (new, symmetric)
    with BuildSketch(Plane(origin=(-6.35, 0, 0), x_dir=(0, 0, -1), z_dir=(1, 0, 0))):
        Polygon((0, 0), (41.135367826, 0), (41.135367826, 10.134139823), (10.348575529, 28.265491808), (0, 28.265491808), align=None)
    extrude(amount=BOSS_EXTRUDE10_DEPTH, both=True)

    # Sketch20 → CBORE for 1/4 Button Head Cap Screw1 (revolve, cut)
    with BuildSketch(Plane(origin=(-6.35, 9.525, -34.1), x_dir=(0, 0, 1), z_dir=(1, 0, 0))):
        Polygon((0, 0), (0, 9.525), (3.2639, 9.525), (3.2639, 0.0254), (5.95376, 0.0254), (5.95376, 0), align=None)
    cbore_for_1_4_button_head_cap_screw1 = revolve(axis=Axis((-6.35, 15.875, -34.1), (0, -1, 0)), mode=Mode.SUBTRACT)


with BuildPart() as body_3_2:
    # Sketch18 → Boss-Extrude11 (new, symmetric)
    with BuildSketch(Plane.ZY.offset(170.18)):
        Polygon((-46.106347996, 0), (0, 0), (0, 27.650979473), (-15.662393155, 27.650979473), (-46.106347996, 8.949692928), align=None)
    extrude(amount=BOSS_EXTRUDE11_DEPTH, both=True)

    # CBORE for 1_4 Button Head Cap Screw1 3: CBORE for 1/4 Button Head Cap Screw1 ×2
    with Locations(*[Vector(-0.9995869944933188, 0, -0.028737439687868672) * (i * CBORE_FOR_1_4_BUTTON_HEAD_CAP_SCREW1_3_PITCH) for i in range(1, CBORE_FOR_1_4_BUTTON_HEAD_CAP_SCREW1_3_COUNT)]):
        add(cbore_for_1_4_button_head_cap_screw1, mode=Mode.SUBTRACT)


with BuildPart() as body_2_1:
    add(body_2.part)

    # CBORE for 1/4 Button Head Cap Screw1 at: CBORE for 1/4 Button Head Cap Screw1 ×2
    with Locations(*[Vector(-0.1888473936501245, 0, 0.9820064469806473) * (i * CBORE_FOR_1_4_BUTTON_HEAD_CAP_SCREW1_AT_PITCH) for i in range(1, CBORE_FOR_1_4_BUTTON_HEAD_CAP_SCREW1_AT_COUNT)]):
        add(cbore_for_1_4_button_head_cap_screw1, mode=Mode.SUBTRACT)

    # CBORE for 1_4 Button Head Cap Screw1 2: CBORE for 1/4 Button Head Cap Screw1 ×2
    with Locations(*[Vector(-0.7728687450196582, 0, 0.6345659169635088) * (i * CBORE_FOR_1_4_BUTTON_HEAD_CAP_SCREW1_2_PITCH) for i in range(1, CBORE_FOR_1_4_BUTTON_HEAD_CAP_SCREW1_2_COUNT)]):
        add(cbore_for_1_4_button_head_cap_screw1, mode=Mode.SUBTRACT)


with BuildPart() as cut_extrude3_tool:
    # Sketch21 → Cut-Extrude3 (new, through all)
    with BuildSketch(Plane.XZ.offset(-9.525)):
        with Locations(Location((-6.35, -34.1, 0), (0, 0, 90))):
            Circle(SKETCH21_R)
        with Locations(Location((-25.4, 64.96, 0), (0, 0, 90))):
            Circle(SKETCH21_R)
        with Locations(Location((-127, 64.96, 0), (0, 0, 90))):
            Circle(SKETCH21_R)
        with Locations(Location((-170.18, -38.81, 0), (0, 0, 90))):
            Circle(SKETCH21_R)
    extrude(amount=-CUT_EXTRUDE3_DEPTH)


with BuildPart() as body_2_3:
    add(body_2_1.part)

    # Cut-Extrude3: cut by cut_extrude3_tool
    add(cut_extrude3_tool.part, mode=Mode.SUBTRACT)

    # Sketch23 → Cut-Extrude4 (cut)
    with BuildSketch(Plane.XY.offset(25.6)):
        with Locations((-100, 17.462853763)):
            Rectangle(SKETCH23_W, SKETCH23_H)
        with Locations((-50, 17.462853763)):
            Rectangle(SKETCH23_W, SKETCH23_H)
    extrude(amount=-CUT_EXTRUDE4_DEPTH, mode=Mode.SUBTRACT)

    # DeleteFace5 outline → DeleteFace5 (add)
    with BuildSketch(Plane.XY.offset(DELETEFACE5_START)):
        with BuildLine():
            Line((-96, 3), (-92.152915204, 3))
            ThreePointArc((-92.152915204, 3), (-94.244436746, 5.409792519), (-96, 8.074292474))
            Line((-96, 8.074292474), (-96, 3))
        make_face()
        with BuildLine():
            ThreePointArc((-54, 8.074292474), (-55.755563254, 5.409792519), (-57.847084796, 3))
            Line((-57.847084796, 3), (-54, 3))
            Line((-54, 3), (-54, 8.074292474))
        make_face()
    extrude(amount=DELETEFACE5_DEPTH)



with BuildPart() as body_2_2_1:
    add(body_2_2.part)

    # Cut-Extrude3: cut by cut_extrude3_tool
    add(cut_extrude3_tool.part, mode=Mode.SUBTRACT)


with BuildPart() as body_3_2_1:
    add(body_3_2.part)

    # Cut-Extrude3: cut by cut_extrude3_tool
    add(cut_extrude3_tool.part, mode=Mode.SUBTRACT)


with BuildPart() as body_4_2:
    # Split1: the piece on the far side of the plane
    add(body_2_2_1.part)
    split(bisect_by=Plane(origin=(6.165549057, 16.727448016, 0), x_dir=(0.9382920658498299, -0.345843894211331, 0), z_dir=(0.345843894211331, 0.93829206584983, 0)), keep=Keep.BOTTOM)


with BuildPart() as body_2_2_2:
    add(body_2_2_1.part)

    # Split1
    split(bisect_by=Plane(origin=(6.165549057, 16.727448016, 0), x_dir=(0.9382920658498299, -0.345843894211331, 0), z_dir=(0.345843894211331, 0.93829206584983, 0)), keep=Keep.TOP)


with BuildPart() as body_4_3:
    # Split2: the piece on the far side of the plane
    add(body_3_2_1.part)
    split(bisect_by=Plane(origin=(-16.244600857, 61.40397222, 0), x_dir=(0.9667417954944176, 0.2557543760021119, 0), z_dir=(0.2557543760021119, -0.9667417954944177, 0)), keep=Keep.BOTTOM)


with BuildPart() as body_3_2_2:
    add(body_3_2_1.part)

    # Split2
    split(bisect_by=Plane(origin=(-16.244600857, 61.40397222, 0), x_dir=(0.9667417954944176, 0.2557543760021119, 0), z_dir=(0.2557543760021119, -0.9667417954944177, 0)), keep=Keep.TOP)


with BuildPart() as body_2_4:
    add(body_2_3.part)

    add(body_3_2_2.part)  # Boss-Extrude12 merges body 3 2

    add(body_4_2.part)  # Boss-Extrude12 merges body 4 2
    # Sketch24 → Boss-Extrude12 (add)
    with BuildSketch(Plane.XZ):
        Polygon((-163.83, -46.106347996), (-139.083749424, -13.738059948), (-40.800135607, -13.738059948), (-12.7, -41.135367826), (-12.7, 0), (-163.83, 0), align=None)
    extrude(amount=-BOSS_EXTRUDE12_DEPTH)

    # Move Face3: a face moved outward by 5.0
    extrude(body_2_4.faces().sort_by_distance((-75, 40.035, 25.6))[0], amount=MOVE_FACE3_BY, dir=(0, 0, 1))

    # Move Face4: a face moved inward by 5.0
    extrude(body_2_4.faces().sort_by_distance((-82.625, 7.8, 5))[0], amount=MOVE_FACE4_BY, dir=(0, 0, 1), mode=Mode.SUBTRACT)

    # Fillet1
    fillet1_edges = [body_2_4.edges().sort_by_distance(p)[0] for p in [
        (-59.75, 35.25, 2.5),
        (-59.75, 4.75, 2.5),
        (-90.25, 4.75, 2.5),
        (-90.25, 35.25, 2.5),
    ]]
    fillet(fillet1_edges, radius=FILLET1_R)

    # Move Face5: a face moved outward by 8.0
    extrude(body_2_4.faces().sort_by_distance((-88.265, 40.5, 5))[0], amount=MOVE_FACE5_BY, dir=(0, 0, 1))


solid = body_2_4.part
